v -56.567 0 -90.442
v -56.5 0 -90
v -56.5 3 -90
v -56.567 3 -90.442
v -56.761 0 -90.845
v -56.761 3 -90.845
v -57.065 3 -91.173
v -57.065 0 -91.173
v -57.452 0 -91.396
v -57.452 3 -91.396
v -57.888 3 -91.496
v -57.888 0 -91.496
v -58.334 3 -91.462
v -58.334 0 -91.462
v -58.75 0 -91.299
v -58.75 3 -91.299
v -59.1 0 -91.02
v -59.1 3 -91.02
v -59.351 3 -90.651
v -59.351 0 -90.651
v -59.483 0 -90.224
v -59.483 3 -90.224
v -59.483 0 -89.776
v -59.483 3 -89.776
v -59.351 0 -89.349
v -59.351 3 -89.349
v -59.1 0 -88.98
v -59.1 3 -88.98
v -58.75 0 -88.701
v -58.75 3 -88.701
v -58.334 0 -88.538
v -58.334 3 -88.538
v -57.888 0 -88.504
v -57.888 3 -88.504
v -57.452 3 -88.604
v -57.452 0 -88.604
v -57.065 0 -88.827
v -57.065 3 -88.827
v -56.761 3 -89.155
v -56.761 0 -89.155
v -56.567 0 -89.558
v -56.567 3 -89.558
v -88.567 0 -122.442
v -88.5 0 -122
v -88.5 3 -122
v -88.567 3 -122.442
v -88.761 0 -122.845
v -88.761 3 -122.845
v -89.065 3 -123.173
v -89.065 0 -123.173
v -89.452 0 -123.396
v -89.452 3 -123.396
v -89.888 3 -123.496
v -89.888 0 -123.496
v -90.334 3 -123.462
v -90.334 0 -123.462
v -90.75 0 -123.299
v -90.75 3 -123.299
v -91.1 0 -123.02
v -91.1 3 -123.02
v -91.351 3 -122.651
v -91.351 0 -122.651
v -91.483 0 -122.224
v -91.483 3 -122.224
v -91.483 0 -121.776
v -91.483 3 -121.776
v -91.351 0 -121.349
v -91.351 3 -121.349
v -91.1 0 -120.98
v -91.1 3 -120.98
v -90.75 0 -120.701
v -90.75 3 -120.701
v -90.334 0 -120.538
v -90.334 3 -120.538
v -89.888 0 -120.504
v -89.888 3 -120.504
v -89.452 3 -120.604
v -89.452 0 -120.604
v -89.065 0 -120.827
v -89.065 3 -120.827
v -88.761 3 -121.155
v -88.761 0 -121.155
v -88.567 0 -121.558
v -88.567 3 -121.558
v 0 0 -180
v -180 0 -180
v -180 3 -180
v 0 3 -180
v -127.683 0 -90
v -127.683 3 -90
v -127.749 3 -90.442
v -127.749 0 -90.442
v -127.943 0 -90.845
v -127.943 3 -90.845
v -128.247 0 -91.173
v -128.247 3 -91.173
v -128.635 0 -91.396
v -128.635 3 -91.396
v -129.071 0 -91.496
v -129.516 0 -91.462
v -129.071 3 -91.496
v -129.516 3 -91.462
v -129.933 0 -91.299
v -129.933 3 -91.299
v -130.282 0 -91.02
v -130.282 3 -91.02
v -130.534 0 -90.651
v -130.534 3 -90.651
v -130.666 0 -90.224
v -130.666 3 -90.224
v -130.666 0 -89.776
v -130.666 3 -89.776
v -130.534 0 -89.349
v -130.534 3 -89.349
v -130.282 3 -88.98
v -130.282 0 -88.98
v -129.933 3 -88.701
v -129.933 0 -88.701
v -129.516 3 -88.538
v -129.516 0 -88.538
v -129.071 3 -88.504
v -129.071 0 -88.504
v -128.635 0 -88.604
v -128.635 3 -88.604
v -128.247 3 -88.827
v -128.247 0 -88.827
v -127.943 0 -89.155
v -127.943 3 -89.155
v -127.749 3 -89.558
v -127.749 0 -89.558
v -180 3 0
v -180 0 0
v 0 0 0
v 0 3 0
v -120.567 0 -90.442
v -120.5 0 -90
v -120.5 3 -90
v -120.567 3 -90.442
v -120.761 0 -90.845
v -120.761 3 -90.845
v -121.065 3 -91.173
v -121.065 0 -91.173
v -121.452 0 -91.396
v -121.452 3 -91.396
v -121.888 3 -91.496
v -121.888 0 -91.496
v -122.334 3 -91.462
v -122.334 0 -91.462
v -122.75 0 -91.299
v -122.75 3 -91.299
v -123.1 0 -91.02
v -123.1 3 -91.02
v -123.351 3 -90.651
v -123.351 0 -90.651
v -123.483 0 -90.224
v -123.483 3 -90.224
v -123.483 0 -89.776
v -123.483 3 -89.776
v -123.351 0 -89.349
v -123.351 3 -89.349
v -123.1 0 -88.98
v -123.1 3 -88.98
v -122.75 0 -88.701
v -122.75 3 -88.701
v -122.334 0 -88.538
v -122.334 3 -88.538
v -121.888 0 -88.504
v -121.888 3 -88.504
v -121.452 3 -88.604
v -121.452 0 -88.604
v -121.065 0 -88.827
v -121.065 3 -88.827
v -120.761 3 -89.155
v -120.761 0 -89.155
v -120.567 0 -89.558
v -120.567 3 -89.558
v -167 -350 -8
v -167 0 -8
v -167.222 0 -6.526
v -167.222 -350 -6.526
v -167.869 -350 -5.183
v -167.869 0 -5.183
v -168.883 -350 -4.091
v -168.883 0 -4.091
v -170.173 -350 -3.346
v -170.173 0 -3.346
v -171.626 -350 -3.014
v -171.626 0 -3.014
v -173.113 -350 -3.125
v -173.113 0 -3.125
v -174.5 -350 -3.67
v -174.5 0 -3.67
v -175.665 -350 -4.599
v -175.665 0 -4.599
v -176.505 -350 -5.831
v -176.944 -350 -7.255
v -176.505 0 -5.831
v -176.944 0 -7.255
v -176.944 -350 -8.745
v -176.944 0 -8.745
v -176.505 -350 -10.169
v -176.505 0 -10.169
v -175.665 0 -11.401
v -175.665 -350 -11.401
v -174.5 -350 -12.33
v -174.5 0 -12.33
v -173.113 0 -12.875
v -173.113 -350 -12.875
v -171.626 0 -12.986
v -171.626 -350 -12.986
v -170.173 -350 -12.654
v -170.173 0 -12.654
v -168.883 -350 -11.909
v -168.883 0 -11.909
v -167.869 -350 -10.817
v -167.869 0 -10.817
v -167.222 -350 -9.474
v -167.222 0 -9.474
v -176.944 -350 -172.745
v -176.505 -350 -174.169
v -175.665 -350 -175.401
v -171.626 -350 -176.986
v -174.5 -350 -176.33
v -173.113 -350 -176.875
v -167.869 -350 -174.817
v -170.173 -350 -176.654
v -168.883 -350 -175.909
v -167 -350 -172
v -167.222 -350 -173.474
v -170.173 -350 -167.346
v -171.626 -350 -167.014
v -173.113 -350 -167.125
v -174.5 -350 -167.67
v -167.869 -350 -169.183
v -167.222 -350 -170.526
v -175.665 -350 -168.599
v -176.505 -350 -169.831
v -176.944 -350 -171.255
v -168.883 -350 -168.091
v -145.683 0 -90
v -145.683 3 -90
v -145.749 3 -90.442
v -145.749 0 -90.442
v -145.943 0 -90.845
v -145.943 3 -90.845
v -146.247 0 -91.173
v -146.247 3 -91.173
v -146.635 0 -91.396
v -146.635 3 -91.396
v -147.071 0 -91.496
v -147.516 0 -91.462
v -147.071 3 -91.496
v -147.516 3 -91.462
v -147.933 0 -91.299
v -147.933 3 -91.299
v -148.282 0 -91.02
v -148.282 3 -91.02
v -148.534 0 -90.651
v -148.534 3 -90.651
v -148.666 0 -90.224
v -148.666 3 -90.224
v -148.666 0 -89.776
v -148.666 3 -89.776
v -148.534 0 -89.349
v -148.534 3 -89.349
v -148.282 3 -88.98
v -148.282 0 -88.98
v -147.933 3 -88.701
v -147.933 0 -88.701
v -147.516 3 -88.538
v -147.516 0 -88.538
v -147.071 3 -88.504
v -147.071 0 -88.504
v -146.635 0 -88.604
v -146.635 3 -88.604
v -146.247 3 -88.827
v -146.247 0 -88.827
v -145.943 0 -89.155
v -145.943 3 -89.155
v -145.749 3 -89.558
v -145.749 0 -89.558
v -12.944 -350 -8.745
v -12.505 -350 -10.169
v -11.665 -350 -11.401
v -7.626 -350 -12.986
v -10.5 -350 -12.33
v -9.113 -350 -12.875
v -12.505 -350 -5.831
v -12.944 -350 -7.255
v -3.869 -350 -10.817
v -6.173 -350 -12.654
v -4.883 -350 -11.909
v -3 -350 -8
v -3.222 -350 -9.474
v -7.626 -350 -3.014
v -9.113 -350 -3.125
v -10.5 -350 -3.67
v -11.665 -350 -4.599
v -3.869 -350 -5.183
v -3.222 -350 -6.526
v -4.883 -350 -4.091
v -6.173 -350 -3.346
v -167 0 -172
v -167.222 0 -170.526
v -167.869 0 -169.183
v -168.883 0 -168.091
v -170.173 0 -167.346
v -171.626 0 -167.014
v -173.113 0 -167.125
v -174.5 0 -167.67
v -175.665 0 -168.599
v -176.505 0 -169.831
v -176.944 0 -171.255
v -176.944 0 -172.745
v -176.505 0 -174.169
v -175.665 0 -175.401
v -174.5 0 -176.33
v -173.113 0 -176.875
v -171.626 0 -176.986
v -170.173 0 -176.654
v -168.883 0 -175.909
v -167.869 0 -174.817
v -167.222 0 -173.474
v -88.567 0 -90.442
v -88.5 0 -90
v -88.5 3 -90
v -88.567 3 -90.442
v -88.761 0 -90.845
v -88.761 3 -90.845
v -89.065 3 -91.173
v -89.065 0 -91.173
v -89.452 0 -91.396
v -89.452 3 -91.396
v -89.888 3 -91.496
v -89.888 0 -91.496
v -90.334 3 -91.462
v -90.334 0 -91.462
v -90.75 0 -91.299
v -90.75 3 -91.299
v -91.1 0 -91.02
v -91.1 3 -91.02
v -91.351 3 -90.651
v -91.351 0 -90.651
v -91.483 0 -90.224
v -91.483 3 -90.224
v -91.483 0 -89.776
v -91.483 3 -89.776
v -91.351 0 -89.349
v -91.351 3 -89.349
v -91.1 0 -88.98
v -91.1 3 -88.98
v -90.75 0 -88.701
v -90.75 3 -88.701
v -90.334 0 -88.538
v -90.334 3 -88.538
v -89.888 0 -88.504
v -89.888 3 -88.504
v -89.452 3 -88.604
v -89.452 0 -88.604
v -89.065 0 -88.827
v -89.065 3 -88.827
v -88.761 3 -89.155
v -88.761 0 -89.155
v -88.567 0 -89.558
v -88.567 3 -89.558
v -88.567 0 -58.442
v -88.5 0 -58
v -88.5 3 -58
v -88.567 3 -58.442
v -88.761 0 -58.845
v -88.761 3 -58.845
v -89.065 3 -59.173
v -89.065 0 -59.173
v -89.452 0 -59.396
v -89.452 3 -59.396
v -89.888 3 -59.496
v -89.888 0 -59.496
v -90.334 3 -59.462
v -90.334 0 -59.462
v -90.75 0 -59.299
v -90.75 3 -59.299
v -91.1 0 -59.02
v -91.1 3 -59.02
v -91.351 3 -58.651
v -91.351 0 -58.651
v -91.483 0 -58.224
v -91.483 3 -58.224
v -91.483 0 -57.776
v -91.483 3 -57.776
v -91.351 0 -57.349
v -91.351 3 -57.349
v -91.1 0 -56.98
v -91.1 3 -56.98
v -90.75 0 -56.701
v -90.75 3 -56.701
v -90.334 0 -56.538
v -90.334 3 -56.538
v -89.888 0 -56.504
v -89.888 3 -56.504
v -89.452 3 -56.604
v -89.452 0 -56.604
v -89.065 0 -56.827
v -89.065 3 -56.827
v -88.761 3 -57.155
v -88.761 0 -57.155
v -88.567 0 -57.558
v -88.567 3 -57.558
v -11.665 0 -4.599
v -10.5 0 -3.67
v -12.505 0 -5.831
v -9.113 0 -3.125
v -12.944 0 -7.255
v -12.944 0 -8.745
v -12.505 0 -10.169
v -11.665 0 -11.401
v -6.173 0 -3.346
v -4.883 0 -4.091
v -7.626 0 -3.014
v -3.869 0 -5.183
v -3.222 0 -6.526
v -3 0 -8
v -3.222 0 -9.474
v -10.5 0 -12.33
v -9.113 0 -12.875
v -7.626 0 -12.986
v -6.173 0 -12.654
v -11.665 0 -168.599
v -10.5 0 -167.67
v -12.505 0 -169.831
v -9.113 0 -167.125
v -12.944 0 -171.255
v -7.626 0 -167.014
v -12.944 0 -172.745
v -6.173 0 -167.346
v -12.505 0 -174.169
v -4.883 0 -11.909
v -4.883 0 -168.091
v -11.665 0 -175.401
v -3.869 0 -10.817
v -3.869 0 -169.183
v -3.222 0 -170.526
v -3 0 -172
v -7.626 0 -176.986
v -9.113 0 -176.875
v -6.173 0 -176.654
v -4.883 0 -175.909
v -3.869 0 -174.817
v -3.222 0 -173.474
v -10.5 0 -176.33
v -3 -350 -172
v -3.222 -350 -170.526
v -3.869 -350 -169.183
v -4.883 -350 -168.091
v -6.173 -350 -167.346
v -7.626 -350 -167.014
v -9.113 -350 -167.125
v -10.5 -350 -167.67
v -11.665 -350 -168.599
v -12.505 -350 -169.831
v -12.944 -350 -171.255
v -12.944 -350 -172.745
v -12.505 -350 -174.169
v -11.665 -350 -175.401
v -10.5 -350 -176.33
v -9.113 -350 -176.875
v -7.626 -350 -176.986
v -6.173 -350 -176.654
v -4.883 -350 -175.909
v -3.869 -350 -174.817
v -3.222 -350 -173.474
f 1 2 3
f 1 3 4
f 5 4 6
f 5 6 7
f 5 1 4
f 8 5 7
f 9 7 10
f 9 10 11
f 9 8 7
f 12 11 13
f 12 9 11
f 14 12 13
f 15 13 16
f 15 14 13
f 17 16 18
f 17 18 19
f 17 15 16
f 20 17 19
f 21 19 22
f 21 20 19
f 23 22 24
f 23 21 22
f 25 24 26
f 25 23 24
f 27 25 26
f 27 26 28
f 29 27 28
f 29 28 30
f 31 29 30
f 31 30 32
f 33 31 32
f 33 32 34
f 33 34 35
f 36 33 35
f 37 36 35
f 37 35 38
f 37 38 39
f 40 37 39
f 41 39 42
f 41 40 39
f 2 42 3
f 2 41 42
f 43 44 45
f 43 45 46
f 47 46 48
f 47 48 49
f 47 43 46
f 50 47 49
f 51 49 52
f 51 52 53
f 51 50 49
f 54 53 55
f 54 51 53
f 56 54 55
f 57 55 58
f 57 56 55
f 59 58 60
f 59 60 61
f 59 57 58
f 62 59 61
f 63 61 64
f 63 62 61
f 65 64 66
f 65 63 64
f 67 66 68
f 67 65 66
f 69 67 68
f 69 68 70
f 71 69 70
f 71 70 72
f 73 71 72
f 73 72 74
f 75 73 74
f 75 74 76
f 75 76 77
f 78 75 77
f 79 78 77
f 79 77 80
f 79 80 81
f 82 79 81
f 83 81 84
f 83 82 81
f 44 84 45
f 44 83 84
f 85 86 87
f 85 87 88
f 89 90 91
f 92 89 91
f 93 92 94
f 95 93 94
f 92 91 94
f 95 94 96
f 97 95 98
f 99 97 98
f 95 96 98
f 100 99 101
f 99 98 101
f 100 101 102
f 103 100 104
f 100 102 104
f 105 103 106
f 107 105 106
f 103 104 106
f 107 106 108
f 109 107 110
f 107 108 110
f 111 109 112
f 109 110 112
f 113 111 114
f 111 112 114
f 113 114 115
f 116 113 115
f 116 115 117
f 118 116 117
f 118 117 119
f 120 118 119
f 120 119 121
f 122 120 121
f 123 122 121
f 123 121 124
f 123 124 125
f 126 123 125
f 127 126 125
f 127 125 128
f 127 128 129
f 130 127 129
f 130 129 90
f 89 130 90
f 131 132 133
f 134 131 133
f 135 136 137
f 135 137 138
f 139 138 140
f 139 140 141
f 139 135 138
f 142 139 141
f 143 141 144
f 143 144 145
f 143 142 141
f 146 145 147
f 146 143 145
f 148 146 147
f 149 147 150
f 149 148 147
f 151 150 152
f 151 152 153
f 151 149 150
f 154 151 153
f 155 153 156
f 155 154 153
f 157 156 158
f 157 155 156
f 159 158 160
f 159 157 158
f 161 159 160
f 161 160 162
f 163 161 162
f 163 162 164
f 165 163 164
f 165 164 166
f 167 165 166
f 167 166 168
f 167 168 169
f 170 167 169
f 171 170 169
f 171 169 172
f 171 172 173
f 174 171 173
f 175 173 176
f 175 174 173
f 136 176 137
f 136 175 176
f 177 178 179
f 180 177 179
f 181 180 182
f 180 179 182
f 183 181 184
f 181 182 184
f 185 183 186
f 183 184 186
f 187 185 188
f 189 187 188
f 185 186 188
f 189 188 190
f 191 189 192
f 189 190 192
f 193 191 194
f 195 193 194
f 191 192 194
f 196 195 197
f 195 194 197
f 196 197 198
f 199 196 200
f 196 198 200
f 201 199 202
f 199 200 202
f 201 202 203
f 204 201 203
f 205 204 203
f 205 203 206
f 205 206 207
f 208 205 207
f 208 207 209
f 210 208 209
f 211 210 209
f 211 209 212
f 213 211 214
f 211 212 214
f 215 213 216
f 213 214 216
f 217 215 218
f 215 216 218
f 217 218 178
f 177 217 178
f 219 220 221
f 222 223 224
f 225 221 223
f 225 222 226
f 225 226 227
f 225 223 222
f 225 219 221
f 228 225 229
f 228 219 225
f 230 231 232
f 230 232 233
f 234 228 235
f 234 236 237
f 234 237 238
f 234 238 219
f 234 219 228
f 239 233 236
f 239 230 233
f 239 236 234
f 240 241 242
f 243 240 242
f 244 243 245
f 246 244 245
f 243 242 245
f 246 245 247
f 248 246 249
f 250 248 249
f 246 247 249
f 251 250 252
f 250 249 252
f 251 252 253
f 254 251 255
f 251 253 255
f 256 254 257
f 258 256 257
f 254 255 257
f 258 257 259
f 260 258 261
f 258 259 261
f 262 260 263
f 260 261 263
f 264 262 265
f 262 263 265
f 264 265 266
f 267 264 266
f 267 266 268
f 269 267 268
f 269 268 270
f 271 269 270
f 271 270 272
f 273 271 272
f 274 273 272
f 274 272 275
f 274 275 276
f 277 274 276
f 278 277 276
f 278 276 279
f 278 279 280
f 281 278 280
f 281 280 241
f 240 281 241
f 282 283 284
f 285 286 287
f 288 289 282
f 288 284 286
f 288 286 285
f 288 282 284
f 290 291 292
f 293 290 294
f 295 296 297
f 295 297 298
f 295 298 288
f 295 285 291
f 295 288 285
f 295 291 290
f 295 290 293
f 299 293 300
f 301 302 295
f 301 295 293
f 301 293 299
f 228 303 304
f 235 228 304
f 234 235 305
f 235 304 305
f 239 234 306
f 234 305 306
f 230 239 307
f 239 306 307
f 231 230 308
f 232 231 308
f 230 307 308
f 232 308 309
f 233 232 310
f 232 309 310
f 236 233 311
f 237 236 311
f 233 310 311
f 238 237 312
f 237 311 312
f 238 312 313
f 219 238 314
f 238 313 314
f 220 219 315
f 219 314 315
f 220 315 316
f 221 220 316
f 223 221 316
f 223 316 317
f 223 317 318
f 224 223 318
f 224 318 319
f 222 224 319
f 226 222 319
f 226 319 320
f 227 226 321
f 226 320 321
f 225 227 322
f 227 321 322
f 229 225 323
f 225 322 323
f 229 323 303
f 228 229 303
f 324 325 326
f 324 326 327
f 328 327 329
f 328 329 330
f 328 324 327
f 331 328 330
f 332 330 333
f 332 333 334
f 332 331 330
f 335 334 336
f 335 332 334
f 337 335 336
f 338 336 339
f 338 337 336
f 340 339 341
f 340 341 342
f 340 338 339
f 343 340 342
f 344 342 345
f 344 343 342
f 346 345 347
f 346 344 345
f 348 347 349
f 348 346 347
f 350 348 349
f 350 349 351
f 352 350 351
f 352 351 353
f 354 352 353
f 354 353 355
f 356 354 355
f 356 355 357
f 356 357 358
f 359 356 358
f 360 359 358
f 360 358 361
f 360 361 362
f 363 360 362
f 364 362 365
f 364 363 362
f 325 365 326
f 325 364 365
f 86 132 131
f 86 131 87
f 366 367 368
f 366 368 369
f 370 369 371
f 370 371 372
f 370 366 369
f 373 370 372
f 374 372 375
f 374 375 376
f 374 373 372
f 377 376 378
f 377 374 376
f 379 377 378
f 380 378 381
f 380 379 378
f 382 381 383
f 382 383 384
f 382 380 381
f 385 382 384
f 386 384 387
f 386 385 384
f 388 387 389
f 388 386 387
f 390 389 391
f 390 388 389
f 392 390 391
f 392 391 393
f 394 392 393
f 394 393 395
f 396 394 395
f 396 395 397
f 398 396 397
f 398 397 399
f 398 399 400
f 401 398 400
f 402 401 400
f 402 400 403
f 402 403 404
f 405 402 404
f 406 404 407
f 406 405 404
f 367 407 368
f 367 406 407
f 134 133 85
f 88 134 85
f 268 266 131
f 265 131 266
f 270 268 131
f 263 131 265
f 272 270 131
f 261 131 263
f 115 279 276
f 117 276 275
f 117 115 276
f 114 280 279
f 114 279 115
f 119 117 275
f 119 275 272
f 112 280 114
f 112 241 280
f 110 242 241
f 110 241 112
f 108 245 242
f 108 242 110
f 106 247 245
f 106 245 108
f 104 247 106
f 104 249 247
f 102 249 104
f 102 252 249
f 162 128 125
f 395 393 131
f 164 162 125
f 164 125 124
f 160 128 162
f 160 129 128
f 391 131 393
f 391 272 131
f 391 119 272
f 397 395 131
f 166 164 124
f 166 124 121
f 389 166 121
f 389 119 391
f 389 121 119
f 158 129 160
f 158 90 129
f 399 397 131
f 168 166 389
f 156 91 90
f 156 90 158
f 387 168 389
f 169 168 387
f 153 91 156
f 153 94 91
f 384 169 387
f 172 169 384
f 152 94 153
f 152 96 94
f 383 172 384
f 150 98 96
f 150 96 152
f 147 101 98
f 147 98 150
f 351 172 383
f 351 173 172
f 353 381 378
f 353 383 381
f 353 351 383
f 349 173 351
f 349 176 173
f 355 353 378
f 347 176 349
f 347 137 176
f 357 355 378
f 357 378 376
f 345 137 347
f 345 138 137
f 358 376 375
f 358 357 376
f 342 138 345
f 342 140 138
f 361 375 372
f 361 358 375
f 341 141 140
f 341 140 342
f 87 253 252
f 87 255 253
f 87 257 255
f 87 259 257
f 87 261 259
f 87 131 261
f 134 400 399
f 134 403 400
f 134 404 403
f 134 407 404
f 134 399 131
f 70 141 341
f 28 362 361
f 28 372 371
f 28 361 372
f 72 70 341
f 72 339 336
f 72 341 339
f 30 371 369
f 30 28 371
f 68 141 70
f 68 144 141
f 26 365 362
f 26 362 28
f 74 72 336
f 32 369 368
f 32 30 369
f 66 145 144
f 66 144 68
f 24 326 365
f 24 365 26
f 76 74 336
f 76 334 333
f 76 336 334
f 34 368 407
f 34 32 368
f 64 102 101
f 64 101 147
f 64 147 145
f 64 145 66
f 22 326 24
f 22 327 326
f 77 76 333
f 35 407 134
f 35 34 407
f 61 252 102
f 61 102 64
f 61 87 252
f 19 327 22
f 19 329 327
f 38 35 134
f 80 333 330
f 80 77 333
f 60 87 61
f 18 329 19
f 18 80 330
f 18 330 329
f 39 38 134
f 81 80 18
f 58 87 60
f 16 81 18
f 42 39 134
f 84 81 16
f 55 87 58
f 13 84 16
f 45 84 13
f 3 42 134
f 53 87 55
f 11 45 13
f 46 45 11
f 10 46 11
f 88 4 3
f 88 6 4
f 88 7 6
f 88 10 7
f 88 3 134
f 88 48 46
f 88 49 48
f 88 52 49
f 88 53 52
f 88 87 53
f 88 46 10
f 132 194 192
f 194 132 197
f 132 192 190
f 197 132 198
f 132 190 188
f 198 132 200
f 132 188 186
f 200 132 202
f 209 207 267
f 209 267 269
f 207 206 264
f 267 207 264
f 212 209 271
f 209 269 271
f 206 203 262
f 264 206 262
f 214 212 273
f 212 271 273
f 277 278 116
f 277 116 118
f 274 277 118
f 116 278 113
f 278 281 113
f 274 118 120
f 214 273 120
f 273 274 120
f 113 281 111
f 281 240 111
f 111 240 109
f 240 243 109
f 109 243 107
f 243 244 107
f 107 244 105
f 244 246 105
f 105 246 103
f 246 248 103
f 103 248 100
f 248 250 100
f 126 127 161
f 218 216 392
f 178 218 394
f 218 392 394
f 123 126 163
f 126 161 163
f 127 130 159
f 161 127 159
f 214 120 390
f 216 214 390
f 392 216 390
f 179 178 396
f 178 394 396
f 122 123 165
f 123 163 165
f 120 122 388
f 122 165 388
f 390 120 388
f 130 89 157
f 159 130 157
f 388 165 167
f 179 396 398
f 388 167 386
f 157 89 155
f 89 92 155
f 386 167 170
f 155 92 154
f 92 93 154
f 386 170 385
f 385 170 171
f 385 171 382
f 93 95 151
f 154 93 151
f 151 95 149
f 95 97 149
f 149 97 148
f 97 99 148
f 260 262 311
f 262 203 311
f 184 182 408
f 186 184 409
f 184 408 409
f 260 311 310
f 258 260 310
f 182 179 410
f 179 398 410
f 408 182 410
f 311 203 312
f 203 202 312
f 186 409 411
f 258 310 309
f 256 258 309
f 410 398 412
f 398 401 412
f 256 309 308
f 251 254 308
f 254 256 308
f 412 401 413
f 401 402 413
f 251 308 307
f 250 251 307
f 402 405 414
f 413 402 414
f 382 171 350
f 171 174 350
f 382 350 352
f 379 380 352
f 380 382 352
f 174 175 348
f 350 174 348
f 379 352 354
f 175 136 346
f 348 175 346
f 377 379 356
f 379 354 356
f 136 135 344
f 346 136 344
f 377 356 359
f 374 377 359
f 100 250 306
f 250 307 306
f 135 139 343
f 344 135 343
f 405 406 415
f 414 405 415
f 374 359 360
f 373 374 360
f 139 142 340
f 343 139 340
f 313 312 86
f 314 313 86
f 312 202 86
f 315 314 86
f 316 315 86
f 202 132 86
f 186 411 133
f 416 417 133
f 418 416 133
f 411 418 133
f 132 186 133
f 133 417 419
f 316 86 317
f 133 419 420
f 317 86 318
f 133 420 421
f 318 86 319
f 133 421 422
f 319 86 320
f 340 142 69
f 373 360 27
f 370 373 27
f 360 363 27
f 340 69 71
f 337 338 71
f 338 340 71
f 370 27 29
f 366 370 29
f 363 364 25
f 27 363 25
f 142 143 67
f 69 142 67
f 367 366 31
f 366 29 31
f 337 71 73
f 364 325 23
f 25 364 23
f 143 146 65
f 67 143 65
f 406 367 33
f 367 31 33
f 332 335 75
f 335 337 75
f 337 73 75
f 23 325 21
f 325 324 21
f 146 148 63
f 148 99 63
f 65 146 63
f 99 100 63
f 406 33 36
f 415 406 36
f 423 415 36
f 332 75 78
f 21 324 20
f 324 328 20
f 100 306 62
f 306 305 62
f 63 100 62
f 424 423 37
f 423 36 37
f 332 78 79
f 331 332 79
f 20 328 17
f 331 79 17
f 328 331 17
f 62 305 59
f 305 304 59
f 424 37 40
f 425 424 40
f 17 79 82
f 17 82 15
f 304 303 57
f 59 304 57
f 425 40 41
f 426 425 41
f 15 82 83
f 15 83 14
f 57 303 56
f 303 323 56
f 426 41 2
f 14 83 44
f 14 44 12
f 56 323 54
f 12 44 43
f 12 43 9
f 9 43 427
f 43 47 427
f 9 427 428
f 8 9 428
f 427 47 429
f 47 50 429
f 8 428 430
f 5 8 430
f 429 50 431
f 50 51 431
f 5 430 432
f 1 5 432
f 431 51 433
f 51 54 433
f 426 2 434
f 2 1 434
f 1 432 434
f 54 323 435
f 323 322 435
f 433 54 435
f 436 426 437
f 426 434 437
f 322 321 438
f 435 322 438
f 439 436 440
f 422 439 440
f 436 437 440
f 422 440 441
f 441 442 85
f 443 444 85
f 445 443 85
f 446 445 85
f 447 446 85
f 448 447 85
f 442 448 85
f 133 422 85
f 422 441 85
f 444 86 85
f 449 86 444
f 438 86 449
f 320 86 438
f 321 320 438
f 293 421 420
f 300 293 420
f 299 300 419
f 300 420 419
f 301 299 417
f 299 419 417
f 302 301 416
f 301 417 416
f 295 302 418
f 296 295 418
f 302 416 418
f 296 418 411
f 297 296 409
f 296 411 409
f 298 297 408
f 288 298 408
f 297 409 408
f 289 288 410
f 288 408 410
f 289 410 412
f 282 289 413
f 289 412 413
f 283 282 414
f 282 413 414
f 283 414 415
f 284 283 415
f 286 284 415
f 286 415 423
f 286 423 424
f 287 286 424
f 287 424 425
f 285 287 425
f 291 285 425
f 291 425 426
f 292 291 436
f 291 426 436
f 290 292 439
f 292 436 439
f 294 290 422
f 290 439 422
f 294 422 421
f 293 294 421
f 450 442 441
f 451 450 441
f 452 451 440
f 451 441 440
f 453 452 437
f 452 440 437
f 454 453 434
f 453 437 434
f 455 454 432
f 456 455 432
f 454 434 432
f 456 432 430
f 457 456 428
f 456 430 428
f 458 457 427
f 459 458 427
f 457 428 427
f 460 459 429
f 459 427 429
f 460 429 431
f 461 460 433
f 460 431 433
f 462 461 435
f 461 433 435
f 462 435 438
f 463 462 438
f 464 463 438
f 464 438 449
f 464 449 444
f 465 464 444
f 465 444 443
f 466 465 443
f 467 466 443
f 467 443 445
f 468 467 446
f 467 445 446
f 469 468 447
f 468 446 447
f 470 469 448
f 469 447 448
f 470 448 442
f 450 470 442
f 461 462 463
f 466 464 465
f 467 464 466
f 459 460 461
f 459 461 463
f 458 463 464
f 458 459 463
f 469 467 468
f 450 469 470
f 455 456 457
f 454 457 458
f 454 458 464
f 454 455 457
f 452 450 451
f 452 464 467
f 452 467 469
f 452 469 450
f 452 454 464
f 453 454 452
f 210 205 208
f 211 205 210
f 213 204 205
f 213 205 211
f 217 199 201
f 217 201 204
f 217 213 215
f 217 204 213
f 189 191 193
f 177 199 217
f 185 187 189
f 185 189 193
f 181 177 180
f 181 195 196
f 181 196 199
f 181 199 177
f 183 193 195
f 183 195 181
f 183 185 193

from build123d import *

# Parameters (mm, degrees)
SKETCH1_W           = 180
SKETCH1_H           = 180
SKETCH1_R           = 1.5
BOSS_EXTRUDE1_DEPTH = 3
SKETCH2_R           = 1.5
CUT_EXTRUDE1_DEPTH  = 4
SKETCH3_R           = 5
BOSS_EXTRUDE2_DEPTH = 350


with BuildPart() as part:
    # Sketch1 → Boss-Extrude1 (new body)
    with BuildSketch(Plane(origin=(0, 0, 0), x_dir=(1, 0, 0), z_dir=(0, 1, 0))):
        with Locations((-90, 90)):
            Rectangle(SKETCH1_W, SKETCH1_H)
        with Locations((-90, 90)):
            Circle(SKETCH1_R, mode=Mode.SUBTRACT)
        with Locations((-58, 90)):
            Circle(SKETCH1_R, mode=Mode.SUBTRACT)
        with Locations((-122, 90)):
            Circle(SKETCH1_R, mode=Mode.SUBTRACT)
        with Locations((-90, 122)):
            Circle(SKETCH1_R, mode=Mode.SUBTRACT)
        with Locations((-90, 58)):
            Circle(SKETCH1_R, mode=Mode.SUBTRACT)
    extrude(amount=BOSS_EXTRUDE1_DEPTH)

    # Sketch2 → Cut-Extrude1 (cut, through all)
    with BuildSketch(Plane(origin=(0, 3, 0), x_dir=(1, 0, 0), z_dir=(0, 1, 0))):
        with Locations((-147.18268, 90)):
            Circle(SKETCH2_R)
        with Locations((-129.18268, 90)):
            Circle(SKETCH2_R)
    extrude(amount=-CUT_EXTRUDE1_DEPTH, mode=Mode.SUBTRACT)

    # Sketch3 → Boss-Extrude2 (add)
    with BuildSketch(Plane.XZ):
        with Locations((-172, -8)):
            Circle(SKETCH3_R)
        with Locations((-8, -8)):
            Circle(SKETCH3_R)
        with Locations((-8, -172)):
            Circle(SKETCH3_R)
        with Locations((-172, -172)):
            Circle(SKETCH3_R)
    extrude(amount=BOSS_EXTRUDE2_DEPTH)


solid = part.part
